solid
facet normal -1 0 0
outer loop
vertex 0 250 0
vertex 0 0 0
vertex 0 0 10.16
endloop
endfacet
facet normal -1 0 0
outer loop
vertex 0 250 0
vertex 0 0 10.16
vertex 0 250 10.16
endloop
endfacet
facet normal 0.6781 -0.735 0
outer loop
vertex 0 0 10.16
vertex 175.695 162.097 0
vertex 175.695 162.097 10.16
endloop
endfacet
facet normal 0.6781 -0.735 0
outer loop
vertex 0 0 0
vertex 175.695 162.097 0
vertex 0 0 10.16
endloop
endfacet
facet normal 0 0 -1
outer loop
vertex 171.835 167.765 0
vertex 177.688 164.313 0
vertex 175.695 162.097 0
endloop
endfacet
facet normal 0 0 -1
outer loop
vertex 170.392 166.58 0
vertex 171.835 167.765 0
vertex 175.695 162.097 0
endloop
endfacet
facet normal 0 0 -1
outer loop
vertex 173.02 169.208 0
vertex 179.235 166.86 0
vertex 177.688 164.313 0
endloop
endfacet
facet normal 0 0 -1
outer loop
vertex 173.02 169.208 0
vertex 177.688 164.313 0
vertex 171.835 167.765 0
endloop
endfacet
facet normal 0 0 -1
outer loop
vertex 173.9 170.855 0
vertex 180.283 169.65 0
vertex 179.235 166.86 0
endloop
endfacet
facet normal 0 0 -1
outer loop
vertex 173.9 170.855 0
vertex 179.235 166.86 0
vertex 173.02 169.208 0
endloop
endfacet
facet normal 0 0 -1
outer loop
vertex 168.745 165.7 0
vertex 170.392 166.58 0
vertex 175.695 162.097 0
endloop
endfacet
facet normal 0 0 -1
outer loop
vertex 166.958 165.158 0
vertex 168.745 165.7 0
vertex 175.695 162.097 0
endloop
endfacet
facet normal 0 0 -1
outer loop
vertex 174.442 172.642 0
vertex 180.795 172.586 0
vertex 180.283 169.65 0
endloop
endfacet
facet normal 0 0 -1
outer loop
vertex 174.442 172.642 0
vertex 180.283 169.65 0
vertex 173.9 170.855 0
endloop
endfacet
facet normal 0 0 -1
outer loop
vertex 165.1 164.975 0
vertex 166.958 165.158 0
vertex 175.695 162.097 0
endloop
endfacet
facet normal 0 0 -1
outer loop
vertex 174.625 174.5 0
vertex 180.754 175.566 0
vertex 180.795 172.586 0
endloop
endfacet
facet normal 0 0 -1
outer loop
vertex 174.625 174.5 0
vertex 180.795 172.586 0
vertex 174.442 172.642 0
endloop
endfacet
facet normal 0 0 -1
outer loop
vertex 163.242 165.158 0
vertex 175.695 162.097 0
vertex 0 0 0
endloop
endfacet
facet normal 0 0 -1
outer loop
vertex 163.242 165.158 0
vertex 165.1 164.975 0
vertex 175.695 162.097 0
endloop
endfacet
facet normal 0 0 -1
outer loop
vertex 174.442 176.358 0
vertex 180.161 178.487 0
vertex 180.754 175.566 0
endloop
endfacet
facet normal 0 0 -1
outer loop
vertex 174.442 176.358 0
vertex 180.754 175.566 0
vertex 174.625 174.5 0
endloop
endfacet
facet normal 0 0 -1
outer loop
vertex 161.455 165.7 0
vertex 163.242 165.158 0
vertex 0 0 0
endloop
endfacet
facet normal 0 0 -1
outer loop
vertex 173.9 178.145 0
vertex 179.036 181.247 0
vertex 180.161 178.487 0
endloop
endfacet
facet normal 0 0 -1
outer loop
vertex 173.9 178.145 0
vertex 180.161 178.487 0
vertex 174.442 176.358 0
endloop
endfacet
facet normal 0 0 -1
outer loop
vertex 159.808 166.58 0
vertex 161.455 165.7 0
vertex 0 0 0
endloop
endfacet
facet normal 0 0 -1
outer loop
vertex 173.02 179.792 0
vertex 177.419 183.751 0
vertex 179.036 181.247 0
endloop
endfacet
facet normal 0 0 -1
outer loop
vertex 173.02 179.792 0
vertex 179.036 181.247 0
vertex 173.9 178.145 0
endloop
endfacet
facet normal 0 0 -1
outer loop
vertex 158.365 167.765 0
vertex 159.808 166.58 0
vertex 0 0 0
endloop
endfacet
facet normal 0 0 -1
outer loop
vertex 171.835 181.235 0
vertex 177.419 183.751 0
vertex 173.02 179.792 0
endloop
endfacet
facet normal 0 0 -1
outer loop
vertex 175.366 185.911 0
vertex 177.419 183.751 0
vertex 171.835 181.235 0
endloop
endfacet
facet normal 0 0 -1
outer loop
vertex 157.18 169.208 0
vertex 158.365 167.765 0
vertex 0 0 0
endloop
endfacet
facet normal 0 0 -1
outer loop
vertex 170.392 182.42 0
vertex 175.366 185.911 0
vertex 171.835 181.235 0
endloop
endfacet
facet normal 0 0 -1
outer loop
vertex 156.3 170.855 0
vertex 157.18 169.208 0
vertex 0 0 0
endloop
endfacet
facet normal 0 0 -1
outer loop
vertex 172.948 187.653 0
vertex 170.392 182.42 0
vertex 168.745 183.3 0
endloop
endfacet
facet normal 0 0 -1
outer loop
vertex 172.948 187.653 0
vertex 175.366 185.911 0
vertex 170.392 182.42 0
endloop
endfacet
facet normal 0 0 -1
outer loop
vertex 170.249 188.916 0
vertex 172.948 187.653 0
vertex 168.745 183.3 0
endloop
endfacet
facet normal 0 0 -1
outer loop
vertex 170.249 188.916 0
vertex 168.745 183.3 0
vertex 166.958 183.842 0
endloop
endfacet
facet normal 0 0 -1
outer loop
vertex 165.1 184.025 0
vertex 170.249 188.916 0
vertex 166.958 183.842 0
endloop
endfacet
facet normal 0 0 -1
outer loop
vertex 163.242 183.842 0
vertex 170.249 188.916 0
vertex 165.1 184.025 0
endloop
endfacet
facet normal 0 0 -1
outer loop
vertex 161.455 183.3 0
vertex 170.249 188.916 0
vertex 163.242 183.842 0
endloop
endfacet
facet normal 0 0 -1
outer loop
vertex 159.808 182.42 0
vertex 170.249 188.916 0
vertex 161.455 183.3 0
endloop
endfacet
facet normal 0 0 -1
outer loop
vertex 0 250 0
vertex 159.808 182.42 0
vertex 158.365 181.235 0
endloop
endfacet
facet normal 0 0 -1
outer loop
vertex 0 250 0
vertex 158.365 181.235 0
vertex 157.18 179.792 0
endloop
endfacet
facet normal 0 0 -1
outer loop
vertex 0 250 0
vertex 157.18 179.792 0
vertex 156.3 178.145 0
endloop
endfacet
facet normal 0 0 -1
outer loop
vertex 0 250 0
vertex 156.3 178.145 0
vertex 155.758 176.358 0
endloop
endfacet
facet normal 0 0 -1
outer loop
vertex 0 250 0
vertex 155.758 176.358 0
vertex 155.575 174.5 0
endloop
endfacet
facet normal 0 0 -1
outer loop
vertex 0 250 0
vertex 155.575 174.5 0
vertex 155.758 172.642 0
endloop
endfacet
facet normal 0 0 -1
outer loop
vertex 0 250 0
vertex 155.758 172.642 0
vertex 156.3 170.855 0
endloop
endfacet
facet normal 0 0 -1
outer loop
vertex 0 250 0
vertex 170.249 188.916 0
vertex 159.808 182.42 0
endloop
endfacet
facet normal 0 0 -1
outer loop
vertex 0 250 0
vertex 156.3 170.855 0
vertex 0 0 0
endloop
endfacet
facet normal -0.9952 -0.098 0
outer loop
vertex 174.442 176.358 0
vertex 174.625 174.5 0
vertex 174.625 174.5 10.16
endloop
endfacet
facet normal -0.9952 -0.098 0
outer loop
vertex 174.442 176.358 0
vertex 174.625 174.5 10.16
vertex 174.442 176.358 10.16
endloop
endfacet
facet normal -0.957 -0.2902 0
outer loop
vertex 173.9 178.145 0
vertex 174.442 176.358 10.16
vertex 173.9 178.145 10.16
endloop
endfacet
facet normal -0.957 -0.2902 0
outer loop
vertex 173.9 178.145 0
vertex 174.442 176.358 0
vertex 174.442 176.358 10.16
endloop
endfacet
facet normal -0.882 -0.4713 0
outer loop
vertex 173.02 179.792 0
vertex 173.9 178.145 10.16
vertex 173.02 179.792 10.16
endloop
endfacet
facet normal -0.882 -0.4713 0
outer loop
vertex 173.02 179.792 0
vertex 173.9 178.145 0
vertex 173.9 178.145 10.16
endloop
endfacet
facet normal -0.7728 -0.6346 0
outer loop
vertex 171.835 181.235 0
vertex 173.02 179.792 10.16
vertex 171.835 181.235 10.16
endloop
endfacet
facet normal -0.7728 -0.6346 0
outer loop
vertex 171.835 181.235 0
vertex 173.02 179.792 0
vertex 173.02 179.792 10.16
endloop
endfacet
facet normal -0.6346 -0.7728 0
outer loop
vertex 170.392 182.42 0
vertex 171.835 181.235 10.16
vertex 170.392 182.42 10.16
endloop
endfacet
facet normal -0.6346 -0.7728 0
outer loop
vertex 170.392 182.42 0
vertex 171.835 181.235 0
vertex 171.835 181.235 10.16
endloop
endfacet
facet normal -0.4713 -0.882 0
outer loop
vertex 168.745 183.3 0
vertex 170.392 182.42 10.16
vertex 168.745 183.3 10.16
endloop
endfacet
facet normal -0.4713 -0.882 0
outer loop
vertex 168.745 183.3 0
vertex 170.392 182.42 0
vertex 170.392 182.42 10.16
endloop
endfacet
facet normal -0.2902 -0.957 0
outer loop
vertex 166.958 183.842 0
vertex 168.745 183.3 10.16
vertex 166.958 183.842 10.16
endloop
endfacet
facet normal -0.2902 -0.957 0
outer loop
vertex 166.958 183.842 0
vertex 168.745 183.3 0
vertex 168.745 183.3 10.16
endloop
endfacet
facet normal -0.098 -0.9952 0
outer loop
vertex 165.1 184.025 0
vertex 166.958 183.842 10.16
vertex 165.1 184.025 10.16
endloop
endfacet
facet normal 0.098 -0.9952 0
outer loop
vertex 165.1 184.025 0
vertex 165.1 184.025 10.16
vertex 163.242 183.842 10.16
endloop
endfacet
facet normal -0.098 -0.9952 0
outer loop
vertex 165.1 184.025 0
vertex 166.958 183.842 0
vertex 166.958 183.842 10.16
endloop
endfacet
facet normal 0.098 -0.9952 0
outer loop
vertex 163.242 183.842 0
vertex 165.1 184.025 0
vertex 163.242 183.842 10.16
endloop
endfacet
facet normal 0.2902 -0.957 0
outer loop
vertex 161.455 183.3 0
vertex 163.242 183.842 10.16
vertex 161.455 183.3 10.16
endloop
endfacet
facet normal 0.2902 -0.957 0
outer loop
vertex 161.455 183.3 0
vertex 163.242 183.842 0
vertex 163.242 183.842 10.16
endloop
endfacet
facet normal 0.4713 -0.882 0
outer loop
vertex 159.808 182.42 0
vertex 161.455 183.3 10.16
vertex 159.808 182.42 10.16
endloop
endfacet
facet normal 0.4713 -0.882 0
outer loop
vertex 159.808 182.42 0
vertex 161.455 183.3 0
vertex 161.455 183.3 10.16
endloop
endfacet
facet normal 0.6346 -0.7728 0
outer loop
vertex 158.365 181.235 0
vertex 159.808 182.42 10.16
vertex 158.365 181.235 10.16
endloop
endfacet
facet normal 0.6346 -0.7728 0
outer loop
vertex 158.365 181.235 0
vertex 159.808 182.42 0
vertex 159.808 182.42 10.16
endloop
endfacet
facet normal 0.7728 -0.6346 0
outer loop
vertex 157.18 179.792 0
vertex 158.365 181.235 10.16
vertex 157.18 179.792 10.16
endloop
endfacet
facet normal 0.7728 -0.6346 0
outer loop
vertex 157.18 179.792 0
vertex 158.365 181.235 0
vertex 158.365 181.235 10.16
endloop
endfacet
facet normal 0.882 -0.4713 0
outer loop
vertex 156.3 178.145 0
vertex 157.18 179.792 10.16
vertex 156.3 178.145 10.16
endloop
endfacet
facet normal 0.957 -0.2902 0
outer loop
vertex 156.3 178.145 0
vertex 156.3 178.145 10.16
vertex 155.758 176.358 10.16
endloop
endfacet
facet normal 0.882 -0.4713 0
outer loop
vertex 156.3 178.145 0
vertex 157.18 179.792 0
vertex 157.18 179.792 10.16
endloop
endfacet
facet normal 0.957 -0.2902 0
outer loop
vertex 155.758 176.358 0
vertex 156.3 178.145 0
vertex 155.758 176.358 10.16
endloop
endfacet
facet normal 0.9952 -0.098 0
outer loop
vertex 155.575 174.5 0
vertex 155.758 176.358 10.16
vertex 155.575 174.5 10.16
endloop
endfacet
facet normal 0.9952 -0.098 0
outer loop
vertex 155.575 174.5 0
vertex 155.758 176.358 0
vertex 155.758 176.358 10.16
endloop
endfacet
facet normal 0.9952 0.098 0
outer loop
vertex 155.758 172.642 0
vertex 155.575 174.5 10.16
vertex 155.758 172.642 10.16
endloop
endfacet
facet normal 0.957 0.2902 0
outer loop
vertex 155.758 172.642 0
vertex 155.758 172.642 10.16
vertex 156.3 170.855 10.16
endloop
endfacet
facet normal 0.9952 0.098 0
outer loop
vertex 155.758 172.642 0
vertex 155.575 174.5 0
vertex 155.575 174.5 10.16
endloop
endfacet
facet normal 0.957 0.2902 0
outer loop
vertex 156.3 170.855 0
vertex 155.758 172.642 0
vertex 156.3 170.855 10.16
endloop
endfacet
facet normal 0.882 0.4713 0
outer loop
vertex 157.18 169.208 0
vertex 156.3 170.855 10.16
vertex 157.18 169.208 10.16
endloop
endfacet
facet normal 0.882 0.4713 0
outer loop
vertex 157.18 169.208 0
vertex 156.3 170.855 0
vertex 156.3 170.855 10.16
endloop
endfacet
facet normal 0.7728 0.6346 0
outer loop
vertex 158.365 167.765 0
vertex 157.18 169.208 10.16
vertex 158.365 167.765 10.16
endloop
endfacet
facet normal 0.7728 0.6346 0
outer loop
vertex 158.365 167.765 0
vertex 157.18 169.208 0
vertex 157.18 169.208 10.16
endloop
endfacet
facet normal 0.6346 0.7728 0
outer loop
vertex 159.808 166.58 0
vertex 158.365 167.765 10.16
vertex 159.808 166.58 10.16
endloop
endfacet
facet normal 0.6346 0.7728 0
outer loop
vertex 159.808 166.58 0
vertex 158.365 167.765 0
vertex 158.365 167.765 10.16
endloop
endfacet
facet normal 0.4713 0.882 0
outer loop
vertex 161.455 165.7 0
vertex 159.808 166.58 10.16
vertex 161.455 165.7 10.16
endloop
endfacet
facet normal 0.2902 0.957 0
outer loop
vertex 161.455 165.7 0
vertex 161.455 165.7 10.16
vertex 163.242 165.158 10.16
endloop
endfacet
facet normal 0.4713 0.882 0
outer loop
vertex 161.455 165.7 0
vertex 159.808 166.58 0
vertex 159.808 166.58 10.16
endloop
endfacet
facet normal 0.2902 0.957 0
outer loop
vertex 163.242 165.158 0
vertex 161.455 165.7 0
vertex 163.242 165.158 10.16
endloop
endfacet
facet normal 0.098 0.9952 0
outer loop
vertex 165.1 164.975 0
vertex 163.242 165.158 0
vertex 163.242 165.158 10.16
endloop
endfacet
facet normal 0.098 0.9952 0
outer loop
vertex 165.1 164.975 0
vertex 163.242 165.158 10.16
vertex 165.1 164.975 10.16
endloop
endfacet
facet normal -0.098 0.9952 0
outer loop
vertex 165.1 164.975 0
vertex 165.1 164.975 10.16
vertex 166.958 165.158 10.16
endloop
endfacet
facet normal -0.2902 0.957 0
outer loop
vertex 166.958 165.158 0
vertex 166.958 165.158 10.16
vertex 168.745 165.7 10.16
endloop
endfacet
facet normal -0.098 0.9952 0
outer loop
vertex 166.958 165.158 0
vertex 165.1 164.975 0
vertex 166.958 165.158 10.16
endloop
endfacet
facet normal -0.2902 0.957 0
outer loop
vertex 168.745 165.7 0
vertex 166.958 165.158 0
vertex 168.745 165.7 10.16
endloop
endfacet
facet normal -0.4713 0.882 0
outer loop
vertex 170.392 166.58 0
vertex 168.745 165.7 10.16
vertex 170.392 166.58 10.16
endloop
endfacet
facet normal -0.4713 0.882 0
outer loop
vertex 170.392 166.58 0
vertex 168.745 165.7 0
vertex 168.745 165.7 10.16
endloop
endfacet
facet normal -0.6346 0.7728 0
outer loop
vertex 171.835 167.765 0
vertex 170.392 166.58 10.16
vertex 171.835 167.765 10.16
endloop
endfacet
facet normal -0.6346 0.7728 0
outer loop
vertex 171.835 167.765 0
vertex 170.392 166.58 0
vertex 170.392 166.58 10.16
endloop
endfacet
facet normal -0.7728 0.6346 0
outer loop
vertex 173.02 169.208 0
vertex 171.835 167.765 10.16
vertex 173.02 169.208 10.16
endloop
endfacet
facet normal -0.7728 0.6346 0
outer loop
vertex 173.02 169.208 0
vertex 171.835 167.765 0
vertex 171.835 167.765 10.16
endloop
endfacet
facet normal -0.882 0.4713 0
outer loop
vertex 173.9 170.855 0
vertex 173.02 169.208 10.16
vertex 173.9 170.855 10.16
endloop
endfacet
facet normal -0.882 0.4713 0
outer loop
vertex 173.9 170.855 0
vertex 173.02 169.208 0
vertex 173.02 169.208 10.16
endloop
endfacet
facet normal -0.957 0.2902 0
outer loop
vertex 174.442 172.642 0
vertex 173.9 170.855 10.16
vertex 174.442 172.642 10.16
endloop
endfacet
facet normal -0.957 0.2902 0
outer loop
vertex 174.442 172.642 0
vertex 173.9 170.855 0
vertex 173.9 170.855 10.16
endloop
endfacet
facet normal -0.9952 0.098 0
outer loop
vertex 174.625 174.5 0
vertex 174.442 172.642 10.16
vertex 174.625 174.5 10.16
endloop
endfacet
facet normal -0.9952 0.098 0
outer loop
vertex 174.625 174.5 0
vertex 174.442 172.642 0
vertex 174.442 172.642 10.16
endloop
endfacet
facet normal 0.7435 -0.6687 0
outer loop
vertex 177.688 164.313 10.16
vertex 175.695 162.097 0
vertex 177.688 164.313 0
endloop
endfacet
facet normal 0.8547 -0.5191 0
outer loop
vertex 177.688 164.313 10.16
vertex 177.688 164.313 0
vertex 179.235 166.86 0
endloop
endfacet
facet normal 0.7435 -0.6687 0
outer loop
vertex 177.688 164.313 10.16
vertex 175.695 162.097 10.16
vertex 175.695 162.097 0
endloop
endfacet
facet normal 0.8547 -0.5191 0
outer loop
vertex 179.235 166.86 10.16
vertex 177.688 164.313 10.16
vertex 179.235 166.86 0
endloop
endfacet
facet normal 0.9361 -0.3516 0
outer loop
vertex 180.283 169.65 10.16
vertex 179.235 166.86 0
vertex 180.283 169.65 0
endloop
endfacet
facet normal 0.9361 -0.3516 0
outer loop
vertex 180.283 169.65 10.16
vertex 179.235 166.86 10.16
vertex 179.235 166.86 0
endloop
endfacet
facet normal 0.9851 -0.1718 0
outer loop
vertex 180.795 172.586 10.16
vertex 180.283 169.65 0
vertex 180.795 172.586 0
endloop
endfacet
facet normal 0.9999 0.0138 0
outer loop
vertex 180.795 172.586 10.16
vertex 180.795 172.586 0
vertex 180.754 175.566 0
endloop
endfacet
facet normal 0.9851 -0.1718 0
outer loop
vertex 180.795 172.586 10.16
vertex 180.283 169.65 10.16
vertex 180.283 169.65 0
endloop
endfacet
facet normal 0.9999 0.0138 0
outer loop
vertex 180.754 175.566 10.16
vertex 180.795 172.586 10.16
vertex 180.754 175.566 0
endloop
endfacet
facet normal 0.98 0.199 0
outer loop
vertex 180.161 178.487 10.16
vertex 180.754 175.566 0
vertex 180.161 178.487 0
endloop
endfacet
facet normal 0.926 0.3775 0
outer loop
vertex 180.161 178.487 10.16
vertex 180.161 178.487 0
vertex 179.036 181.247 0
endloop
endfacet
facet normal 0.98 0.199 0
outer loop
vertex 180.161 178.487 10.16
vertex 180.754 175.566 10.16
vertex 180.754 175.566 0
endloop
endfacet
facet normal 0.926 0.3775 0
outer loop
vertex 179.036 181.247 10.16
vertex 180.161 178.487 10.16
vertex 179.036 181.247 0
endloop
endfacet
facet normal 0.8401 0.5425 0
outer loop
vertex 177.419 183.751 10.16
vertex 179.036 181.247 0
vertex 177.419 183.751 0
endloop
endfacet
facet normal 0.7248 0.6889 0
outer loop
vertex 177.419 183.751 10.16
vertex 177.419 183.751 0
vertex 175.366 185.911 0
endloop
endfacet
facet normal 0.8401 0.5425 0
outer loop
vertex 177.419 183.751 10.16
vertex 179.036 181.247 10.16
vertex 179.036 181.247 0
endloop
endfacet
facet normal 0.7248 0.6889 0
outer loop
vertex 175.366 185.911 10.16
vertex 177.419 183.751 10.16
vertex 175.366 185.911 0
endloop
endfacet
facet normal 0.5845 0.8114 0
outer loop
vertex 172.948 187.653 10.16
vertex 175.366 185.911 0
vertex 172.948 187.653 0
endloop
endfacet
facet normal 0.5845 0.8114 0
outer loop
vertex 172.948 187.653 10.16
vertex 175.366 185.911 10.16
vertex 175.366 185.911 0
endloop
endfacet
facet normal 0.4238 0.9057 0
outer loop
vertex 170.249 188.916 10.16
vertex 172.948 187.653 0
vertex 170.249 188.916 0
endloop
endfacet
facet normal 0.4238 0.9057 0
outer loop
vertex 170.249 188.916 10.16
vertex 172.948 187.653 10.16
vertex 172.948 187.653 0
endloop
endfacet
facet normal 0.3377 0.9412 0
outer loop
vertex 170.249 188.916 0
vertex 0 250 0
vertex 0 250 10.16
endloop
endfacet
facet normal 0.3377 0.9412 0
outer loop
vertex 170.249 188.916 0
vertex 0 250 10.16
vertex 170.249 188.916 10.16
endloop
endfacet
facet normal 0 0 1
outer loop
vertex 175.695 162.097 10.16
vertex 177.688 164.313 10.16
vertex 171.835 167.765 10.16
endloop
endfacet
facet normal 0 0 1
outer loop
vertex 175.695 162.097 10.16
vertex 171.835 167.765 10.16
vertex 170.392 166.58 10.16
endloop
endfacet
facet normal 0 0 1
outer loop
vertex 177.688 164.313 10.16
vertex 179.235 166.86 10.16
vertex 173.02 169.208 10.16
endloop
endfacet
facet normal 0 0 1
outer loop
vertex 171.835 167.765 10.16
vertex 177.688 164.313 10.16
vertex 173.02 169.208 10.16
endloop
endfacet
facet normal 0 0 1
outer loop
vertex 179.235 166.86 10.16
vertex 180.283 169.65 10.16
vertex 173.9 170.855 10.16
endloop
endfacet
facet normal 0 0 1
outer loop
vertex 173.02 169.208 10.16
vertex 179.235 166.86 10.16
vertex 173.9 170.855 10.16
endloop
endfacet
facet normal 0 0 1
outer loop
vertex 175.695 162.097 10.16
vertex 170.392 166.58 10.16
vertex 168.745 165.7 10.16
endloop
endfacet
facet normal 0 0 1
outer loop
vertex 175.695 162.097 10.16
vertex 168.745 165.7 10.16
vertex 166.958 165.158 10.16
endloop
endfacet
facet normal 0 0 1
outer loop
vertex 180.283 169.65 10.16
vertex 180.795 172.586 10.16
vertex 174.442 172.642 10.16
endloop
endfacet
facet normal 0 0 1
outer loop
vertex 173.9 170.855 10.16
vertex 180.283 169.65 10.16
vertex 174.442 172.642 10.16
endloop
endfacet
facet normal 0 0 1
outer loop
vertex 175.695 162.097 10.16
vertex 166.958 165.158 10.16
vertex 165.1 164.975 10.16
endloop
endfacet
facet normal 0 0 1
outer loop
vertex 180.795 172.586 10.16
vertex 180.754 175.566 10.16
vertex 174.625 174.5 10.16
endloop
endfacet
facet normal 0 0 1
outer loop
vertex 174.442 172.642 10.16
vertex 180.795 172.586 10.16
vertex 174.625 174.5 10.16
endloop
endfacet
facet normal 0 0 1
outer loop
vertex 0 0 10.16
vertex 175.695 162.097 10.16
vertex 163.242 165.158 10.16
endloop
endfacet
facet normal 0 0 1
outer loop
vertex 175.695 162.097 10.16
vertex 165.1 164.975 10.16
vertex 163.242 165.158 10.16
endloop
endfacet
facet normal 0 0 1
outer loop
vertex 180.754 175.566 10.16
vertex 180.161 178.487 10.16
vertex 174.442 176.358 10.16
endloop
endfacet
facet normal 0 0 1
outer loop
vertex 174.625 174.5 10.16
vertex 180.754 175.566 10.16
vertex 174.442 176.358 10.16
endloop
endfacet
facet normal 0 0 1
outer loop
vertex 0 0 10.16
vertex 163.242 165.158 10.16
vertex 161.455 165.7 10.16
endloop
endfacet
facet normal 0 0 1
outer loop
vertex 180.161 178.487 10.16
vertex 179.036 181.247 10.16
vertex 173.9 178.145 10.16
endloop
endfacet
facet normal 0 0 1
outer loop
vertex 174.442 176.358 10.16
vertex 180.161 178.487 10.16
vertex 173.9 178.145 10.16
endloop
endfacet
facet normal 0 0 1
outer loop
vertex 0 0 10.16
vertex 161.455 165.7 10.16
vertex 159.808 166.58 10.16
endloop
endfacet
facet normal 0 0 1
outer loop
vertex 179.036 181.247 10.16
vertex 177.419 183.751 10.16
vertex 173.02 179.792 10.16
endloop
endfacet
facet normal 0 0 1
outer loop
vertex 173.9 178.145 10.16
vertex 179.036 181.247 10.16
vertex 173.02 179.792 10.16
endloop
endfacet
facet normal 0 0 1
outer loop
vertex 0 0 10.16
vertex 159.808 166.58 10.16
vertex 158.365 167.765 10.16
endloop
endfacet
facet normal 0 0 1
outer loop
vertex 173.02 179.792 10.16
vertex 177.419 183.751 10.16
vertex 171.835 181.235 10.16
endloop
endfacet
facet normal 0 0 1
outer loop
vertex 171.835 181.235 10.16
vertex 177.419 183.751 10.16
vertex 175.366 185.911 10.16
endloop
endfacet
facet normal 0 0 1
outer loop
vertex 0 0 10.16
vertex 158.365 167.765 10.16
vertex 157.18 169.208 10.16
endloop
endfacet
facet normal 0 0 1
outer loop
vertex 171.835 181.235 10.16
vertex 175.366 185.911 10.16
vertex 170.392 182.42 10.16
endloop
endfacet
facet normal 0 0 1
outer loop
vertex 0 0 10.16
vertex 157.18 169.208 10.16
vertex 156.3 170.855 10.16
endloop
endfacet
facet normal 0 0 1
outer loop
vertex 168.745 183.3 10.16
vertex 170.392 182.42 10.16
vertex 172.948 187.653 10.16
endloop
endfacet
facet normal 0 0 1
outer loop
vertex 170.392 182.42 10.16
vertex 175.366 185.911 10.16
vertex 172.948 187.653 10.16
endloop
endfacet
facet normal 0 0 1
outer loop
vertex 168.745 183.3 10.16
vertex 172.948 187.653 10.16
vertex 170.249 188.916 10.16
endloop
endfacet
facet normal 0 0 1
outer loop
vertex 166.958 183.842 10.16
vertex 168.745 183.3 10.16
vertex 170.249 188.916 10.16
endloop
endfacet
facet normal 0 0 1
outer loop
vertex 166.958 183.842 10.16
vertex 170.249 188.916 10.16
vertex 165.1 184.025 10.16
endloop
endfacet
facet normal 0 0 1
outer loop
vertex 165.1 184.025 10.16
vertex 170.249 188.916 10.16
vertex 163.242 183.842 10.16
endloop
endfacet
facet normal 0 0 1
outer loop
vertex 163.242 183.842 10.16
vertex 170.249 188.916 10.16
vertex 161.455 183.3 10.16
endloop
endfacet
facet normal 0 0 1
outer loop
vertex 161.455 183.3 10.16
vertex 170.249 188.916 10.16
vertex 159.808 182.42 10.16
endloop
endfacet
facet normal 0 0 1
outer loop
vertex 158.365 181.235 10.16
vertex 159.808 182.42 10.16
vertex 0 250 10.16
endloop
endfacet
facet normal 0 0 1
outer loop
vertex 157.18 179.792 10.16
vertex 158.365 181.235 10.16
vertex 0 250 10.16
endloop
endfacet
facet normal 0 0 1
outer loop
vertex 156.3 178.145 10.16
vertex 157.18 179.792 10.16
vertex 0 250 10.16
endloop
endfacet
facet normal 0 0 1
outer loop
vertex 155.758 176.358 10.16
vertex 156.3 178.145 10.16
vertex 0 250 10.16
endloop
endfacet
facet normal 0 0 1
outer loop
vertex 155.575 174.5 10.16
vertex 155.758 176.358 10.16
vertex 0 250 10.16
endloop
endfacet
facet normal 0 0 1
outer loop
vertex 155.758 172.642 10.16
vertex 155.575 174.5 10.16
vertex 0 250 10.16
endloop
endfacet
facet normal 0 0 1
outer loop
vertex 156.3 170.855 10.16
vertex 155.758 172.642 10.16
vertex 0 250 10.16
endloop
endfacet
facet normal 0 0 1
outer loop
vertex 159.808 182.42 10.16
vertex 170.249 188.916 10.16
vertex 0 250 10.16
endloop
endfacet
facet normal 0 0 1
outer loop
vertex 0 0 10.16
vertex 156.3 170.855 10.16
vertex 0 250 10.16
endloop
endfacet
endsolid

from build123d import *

# Parameters (mm, degrees)
SKETCH1_R           = 9.525
BOSS_EXTRUDE1_DEPTH = 10.16
FILLET1_R           = 16


with BuildPart() as part:
    # Sketch1 → Boss-Extrude1 (new body)
    with BuildSketch(Plane.XY):
        Polygon((0, 0), (0, 250), (195.1, 180), align=None)
        with Locations((165.1, 174.5)):
            Circle(SKETCH1_R, mode=Mode.SUBTRACT)
    extrude(amount=BOSS_EXTRUDE1_DEPTH)

    # Fillet1
    fillet1_edges = [part.edges().sort_by_distance(p)[0] for p in [
        (195.1, 180, 5.08),
    ]]
    fillet(fillet1_edges, radius=FILLET1_R)


solid = part.part
